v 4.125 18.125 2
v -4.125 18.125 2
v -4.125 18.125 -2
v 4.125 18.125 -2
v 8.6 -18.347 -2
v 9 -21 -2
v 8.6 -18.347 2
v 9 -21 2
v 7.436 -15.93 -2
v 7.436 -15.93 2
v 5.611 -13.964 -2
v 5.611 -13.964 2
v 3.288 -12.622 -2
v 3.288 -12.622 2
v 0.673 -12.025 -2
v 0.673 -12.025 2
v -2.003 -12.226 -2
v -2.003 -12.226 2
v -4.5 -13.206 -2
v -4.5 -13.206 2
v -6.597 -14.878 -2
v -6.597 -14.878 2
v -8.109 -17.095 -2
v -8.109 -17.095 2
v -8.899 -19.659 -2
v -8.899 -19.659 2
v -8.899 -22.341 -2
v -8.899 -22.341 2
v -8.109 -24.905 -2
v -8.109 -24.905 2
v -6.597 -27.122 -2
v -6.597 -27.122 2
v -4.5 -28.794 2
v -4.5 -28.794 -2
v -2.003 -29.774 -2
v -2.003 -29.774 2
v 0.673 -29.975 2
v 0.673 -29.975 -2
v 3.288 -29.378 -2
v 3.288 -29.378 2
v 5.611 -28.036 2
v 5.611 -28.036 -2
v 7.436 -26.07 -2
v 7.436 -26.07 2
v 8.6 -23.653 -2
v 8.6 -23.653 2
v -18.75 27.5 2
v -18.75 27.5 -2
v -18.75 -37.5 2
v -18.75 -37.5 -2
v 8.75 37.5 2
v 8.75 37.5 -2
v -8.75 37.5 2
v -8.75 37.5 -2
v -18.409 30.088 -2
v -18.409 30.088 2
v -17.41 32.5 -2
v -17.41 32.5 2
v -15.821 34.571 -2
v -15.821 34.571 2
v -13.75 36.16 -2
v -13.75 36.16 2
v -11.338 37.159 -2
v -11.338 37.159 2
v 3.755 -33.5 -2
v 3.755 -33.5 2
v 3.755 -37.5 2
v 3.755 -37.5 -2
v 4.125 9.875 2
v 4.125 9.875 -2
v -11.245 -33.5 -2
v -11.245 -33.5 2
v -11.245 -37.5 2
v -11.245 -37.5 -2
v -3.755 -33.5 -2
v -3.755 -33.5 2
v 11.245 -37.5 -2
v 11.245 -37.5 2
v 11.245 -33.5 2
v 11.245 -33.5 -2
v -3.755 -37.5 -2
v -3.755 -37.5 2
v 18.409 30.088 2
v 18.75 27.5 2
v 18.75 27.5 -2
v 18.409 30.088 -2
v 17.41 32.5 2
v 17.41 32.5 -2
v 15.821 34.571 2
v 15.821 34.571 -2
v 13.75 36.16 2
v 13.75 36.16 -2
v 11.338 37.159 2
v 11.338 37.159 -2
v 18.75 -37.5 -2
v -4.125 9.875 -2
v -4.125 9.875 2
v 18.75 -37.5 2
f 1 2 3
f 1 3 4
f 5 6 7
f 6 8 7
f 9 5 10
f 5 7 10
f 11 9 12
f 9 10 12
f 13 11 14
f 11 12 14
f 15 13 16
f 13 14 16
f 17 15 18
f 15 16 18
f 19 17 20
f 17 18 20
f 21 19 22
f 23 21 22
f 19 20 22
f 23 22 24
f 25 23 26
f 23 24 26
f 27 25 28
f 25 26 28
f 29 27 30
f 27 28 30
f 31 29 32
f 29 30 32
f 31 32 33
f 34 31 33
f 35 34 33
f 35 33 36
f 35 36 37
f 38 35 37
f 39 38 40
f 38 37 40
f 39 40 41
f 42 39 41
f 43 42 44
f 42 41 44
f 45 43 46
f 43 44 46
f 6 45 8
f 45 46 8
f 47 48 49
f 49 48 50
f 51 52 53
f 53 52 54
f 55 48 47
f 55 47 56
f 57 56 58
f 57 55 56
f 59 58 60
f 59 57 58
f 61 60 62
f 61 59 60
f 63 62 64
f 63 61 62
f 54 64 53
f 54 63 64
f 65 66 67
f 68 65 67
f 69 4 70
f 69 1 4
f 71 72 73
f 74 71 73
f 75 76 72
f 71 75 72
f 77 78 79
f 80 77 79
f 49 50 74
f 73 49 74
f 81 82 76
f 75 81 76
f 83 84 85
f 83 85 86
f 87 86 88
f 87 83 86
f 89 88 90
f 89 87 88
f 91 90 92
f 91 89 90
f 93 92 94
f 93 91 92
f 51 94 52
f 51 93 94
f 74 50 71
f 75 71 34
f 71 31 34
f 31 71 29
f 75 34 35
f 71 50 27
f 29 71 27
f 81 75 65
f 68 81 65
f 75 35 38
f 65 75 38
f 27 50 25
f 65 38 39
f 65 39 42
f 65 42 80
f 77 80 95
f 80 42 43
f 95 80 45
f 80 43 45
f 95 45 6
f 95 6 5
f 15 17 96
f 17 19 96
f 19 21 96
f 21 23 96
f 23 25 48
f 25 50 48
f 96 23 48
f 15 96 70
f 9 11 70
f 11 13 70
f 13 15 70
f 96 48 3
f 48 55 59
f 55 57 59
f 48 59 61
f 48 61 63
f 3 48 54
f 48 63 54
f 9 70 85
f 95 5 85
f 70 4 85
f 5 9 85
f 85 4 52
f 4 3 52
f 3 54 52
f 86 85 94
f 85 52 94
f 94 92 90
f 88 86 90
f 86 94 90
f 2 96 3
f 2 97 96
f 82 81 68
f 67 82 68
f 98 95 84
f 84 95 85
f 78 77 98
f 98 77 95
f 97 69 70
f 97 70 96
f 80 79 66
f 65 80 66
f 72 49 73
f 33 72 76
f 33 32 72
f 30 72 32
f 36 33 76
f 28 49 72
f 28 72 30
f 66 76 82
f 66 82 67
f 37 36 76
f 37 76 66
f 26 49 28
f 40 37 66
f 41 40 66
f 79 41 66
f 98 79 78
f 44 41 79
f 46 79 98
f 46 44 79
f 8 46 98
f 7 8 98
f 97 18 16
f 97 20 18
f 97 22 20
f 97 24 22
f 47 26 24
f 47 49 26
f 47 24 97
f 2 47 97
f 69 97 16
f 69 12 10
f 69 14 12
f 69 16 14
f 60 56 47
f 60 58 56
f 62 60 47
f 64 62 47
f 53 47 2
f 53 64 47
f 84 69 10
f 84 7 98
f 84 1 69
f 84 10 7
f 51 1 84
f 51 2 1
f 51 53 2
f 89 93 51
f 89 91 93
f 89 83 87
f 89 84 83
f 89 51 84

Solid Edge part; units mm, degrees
sketch "Sketch1" plane through (0, 0, 0) normal (0, 0, 1) x (1, 0, 0)
  line L0 (-18.75, -37.5) -> (18.75, -37.5)
  line L1 (18.75, -37.5) -> (18.75, 37.5)
  line L2 (18.75, 37.5) -> (-18.75, 37.5)
  line L3 (-18.75, 37.5) -> (-18.75, -37.5)
  dimension "D1" = 37.5
  dimension "D2" = 75
extrude "Protrusion1" add sketch "Sketch1" along normal mid plane 4
sketch "Sketch2" plane through (0, 0, 2) normal (0, 0, 1) x (1, 0, 0)
  line L0 (3.755, -37.5) -> (11.245, -37.5)
  line L1 (11.245, -37.5) -> (11.245, -33.5)
  line L2 (11.245, -33.5) -> (3.755, -33.5)
  line L3 (3.755, -33.5) -> (3.755, -37.5)
  line L4 (-11.245, -37.5) -> (-3.755, -37.5)
  line L5 (-3.755, -37.5) -> (-3.755, -33.5)
  line L6 (-3.755, -33.5) -> (-11.245, -33.5)
  line L7 (-11.245, -33.5) -> (-11.245, -37.5)
  dimension "D1" = 7.49
  dimension "D2" = 7.49
  dimension "D3" = 15
  dimension "D4" = 4
  dimension "D5" = 4
  dimension "D6" = 11.25
extrude "Extrusionsausschnitt_1" cut sketch "Sketch2" against normal blind 8
sketch "Sketch3" plane through (0, 0, 2) normal (0, 0, 1) x (1, 0, 0)
  line L0 (-4.125, 18.125) -> (4.125, 18.125)
  line L1 (4.125, 18.125) -> (4.125, 9.875)
  line L2 (4.125, 9.875) -> (-4.125, 9.875)
  line L3 (-4.125, 9.875) -> (-4.125, 18.125)
  dimension "D1" = 8.25
  dimension "D2" = 8.25
  dimension "D3" = 23.5
  dimension "D4" = 18.75
extrude "Extrusionsausschnitt_2" cut sketch "Sketch3" against normal blind 44
fillet "Verrundung_1" radius 10 2 edges at (18.75, 37.5, 0) (-18.75, 37.5, 0)
sketch "Sketch4" plane through (0, 0, 2) normal (0, 0, 1) x (1, 0, 0)
  circle A0 centre (0, -21) radius 9
  dimension "D1" = 18
  dimension "D2" = 12.5
extrude "Extrusionsausschnitt_3" cut sketch "Sketch4" against normal blind 148
properties material "Holz, Kiefer"
